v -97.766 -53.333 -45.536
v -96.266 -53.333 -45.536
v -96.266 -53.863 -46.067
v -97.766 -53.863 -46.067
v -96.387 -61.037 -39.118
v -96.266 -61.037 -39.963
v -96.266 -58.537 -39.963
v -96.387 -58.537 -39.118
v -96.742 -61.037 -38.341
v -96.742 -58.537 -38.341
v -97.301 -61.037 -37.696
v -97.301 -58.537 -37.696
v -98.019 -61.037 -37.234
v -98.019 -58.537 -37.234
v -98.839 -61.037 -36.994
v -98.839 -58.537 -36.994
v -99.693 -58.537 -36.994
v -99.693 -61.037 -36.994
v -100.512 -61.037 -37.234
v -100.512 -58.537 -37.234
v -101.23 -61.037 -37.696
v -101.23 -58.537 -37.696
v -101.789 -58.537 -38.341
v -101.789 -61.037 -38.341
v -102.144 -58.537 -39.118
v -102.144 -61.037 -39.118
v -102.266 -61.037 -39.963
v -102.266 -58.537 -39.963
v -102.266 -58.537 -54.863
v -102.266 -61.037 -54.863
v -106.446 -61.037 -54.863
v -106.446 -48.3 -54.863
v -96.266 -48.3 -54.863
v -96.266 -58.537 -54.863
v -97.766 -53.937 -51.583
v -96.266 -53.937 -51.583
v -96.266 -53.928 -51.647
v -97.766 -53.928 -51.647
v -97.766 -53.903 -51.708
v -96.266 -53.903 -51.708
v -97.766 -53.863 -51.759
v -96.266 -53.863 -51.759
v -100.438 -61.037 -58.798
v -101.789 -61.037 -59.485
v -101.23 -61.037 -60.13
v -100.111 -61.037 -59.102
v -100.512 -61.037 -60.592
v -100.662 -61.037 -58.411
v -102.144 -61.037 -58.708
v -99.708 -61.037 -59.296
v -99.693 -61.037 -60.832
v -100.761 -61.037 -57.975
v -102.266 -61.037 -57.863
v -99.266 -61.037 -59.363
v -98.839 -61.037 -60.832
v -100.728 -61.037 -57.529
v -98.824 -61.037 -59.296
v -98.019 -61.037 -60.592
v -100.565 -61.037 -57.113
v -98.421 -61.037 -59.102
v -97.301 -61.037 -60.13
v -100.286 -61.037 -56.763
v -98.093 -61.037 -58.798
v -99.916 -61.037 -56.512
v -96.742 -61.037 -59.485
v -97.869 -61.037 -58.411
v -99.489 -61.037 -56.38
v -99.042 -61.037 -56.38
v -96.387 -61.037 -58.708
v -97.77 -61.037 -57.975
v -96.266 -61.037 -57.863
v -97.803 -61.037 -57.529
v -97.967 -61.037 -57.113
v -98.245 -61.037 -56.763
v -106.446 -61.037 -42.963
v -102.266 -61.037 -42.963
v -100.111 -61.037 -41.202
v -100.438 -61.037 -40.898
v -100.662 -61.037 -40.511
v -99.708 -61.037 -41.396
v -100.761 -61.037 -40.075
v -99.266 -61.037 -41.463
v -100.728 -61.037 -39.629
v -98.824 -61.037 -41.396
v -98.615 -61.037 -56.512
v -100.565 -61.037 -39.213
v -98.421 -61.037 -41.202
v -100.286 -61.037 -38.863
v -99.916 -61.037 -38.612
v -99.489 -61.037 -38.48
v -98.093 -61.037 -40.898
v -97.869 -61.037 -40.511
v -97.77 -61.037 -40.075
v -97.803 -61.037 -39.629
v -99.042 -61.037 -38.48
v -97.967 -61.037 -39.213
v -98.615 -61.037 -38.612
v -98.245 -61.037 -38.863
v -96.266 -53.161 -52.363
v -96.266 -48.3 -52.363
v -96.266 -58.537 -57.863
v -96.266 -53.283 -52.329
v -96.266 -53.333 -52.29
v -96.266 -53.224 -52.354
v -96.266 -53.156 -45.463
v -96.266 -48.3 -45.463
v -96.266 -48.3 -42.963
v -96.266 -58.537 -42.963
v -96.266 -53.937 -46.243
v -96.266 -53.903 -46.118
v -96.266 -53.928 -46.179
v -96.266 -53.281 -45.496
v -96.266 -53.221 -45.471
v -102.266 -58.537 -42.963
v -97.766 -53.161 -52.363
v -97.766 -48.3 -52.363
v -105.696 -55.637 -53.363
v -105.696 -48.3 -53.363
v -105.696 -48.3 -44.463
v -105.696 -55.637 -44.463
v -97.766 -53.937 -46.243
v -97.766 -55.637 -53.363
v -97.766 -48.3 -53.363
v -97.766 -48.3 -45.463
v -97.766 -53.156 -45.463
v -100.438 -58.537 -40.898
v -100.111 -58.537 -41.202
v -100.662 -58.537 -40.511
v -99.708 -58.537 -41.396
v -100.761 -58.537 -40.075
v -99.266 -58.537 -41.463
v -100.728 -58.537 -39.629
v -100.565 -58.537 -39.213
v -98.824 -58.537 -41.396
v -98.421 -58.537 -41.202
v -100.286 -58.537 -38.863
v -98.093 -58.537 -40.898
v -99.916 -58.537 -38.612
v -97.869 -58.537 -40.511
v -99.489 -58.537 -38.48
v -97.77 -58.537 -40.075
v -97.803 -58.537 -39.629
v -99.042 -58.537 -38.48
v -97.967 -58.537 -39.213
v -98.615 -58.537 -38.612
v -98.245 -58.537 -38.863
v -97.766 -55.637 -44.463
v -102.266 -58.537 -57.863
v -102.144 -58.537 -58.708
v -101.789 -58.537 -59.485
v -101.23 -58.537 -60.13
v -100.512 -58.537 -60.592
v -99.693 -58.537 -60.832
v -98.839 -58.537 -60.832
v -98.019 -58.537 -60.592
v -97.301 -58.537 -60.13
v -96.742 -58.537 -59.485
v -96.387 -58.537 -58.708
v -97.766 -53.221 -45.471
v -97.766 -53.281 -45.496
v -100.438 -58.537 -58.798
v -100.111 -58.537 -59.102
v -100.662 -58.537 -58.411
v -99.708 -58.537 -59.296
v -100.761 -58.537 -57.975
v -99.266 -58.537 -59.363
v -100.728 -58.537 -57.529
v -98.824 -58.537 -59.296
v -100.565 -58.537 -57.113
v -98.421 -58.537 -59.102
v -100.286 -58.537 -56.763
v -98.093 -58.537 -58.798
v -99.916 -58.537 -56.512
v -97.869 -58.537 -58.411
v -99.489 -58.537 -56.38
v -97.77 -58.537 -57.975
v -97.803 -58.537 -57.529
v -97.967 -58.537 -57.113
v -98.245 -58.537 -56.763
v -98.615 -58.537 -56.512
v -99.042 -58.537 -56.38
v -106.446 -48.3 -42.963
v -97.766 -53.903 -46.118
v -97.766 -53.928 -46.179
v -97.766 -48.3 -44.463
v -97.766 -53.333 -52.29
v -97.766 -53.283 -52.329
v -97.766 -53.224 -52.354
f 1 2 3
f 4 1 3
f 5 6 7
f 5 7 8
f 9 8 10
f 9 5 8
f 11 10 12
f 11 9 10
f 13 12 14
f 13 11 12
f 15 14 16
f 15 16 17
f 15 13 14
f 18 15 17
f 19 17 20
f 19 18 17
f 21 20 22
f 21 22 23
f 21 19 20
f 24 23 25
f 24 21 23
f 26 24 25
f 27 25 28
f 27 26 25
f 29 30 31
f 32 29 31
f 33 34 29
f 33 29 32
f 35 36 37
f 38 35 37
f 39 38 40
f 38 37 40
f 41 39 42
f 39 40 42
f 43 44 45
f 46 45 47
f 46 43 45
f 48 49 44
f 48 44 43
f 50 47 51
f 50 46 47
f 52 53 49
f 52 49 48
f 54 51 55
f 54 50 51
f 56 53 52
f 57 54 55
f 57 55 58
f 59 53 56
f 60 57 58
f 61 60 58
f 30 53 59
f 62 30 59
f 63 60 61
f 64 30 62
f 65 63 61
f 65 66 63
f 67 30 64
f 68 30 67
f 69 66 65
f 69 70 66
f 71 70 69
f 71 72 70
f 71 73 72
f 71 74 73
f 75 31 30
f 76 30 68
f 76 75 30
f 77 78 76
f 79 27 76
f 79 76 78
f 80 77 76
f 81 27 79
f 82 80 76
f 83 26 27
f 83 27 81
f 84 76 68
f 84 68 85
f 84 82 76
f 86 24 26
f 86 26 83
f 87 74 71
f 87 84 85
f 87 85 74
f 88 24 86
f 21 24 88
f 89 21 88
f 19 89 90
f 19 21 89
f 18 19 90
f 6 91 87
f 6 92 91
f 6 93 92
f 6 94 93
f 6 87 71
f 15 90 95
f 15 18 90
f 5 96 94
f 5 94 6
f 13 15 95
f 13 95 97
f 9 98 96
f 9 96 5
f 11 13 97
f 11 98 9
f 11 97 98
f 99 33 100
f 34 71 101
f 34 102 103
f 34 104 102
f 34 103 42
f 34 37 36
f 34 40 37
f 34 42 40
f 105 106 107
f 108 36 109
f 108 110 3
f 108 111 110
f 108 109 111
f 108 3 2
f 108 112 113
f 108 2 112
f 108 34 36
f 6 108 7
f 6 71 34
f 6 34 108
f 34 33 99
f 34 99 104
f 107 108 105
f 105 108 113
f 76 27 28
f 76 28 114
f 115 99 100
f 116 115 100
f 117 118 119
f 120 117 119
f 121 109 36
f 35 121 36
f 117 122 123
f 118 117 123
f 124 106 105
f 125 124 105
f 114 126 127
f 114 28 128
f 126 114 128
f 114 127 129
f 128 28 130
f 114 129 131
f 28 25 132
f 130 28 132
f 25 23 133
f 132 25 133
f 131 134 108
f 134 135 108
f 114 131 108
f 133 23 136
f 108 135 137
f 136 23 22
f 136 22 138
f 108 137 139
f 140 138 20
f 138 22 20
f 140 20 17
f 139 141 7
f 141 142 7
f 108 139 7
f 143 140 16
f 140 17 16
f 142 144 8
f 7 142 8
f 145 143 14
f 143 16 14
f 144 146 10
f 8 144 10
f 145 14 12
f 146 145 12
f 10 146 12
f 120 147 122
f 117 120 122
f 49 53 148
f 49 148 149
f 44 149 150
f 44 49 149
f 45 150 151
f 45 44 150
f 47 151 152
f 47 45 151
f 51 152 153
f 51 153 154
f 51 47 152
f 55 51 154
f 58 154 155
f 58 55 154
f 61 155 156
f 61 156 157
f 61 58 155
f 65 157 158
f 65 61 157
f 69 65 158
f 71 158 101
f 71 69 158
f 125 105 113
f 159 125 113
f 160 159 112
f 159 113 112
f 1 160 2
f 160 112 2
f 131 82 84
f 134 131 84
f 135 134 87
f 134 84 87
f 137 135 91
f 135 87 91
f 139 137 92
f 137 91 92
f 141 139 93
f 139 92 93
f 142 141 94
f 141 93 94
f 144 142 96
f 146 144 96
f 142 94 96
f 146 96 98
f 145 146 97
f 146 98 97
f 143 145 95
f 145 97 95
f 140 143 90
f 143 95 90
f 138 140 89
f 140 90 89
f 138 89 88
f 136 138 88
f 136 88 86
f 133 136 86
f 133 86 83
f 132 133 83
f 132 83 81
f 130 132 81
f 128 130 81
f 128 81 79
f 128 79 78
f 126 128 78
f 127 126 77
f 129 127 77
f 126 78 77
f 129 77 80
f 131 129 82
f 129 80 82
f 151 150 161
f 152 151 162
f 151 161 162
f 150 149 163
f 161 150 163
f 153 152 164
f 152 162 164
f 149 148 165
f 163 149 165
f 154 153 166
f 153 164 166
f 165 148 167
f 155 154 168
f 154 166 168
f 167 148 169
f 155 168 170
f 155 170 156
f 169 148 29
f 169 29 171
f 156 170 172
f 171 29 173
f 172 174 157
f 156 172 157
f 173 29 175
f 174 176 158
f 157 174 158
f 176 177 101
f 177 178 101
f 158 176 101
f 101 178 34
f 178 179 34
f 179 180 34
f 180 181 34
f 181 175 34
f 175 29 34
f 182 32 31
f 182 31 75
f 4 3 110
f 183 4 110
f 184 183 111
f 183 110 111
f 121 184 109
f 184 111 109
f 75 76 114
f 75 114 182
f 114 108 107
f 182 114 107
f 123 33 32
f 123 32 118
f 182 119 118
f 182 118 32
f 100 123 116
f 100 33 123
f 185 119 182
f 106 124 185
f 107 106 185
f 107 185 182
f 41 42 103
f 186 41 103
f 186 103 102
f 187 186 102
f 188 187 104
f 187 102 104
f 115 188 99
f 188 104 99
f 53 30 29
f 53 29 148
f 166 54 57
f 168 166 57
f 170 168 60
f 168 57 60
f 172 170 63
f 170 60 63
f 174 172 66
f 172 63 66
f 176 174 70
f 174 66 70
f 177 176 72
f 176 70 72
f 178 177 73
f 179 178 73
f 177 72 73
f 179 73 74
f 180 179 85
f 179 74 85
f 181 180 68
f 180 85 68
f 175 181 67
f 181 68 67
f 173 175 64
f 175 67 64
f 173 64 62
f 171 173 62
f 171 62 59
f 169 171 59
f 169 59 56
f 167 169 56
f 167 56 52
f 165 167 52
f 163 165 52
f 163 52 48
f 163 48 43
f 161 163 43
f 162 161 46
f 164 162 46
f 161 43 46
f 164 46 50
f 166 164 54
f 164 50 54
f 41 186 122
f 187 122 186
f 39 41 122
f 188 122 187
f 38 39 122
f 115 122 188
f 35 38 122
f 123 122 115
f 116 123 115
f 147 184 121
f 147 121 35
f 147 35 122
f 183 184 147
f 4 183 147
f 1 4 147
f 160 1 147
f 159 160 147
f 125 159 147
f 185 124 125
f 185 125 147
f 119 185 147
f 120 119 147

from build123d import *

# Parameters (mm, degrees)
BOSS_EXTRUDE6_START     = 1.5
BOSS_EXTRUDE6_DEPTH     = 1.5
BOSS_EXTRUDE7_START     = 3
SKETCH1_5_W             = 11.9
SKETCH1_5_H             = 5.3
SKETCH1_5_W_2           = 1.5
SKETCH1_5_H_2           = 5.936611654
BOSS_EXTRUDE7_DEPTH     = 7.93
BOSS_EXTRUDE8_START     = 10.93
BOSS_EXTRUDE8_OUTLINE_W = 11.9
BOSS_EXTRUDE8_OUTLINE_H = 12.736611654
BOSS_EXTRUDE8_DEPTH     = 0.75
SKETCH4_R               = 1.5
BOSS_EXTRUDE10_DEPTH    = 2.5


# Read off the part's stored shape, not the designer's step: Boss-Extrude8
with BuildPart() as part:
    # Sketch1 → Boss-Extrude6 (new body)
    with BuildSketch(Plane.ZY.offset(94.76563723).offset(BOSS_EXTRUDE6_START)):
        with BuildLine():
            Line((-51.759425025, -53.863488773), (-52.289755114, -53.333158684))
            ThreePointArc((-52.289755114, -53.333158684), (-52.343100233, -53.254101332), (-52.362978418, -53.160824194))
            Line((-52.362978418, -53.160824194), (-52.362978418, -48.300100424))
            Line((-52.362978418, -48.300100424), (-54.862978418, -48.300100424))
            Line((-54.862978418, -48.300100424), (-54.862978418, -61.036712078))
            Line((-54.862978418, -61.036712078), (-42.962978418, -61.036712078))
            Line((-42.962978418, -61.036712078), (-42.962978418, -48.300100424))
            Line((-42.962978418, -48.300100424), (-45.462978418, -48.300100424))
            Line((-45.462978418, -48.300100424), (-45.462978418, -53.156381989))
            ThreePointArc((-45.462978418, -53.156381989), (-45.482008535, -53.252052847), (-45.536201723, -53.333158684))
            Line((-45.536201723, -53.333158684), (-46.066531809, -53.86348877))
            ThreePointArc((-46.066531809, -53.86348877), (-46.147637646, -53.917681958), (-46.243308504, -53.936712075))
            Line((-46.243308504, -53.936712075), (-51.582648329, -53.936712078))
            ThreePointArc((-51.582648329, -53.936712078), (-51.678319187, -53.917681961), (-51.759425025, -53.863488773))
        make_face()
    extrude(amount=BOSS_EXTRUDE6_DEPTH)

    # Sketch1<5> → Boss-Extrude7 (add)
    with BuildSketch(Plane.ZY.offset(94.76563723).offset(BOSS_EXTRUDE7_START)):
        with Locations((-48.912978418, -58.386712078)):
            Rectangle(SKETCH1_5_W, SKETCH1_5_H)
        Polygon((-53.362978418, -55.636712078), (-53.362978418, -54.236712078), (-54.862978418, -54.236712078), (-54.862978418, -55.736712078), (-42.962978418, -55.736712078), (-42.962978418, -54.236712078), (-44.462978418, -54.236712078), (-44.462978418, -55.636712078), align=None)
        with Locations((-54.112978418, -51.268406251)):
            Rectangle(SKETCH1_5_W_2, SKETCH1_5_H_2)
        with Locations((-43.712978418, -51.268406251)):
            Rectangle(SKETCH1_5_W_2, SKETCH1_5_H_2)
    extrude(amount=BOSS_EXTRUDE7_DEPTH)

    # Boss-Extrude8 outline → Boss-Extrude8 (add)
    with BuildSketch(Plane.ZY.offset(94.76563723).offset(BOSS_EXTRUDE8_START)):
        with Locations((-48.912978418, -54.668406251)):
            Rectangle(BOSS_EXTRUDE8_OUTLINE_W, BOSS_EXTRUDE8_OUTLINE_H)
    extrude(amount=BOSS_EXTRUDE8_DEPTH)

    # Sketch4 → Boss-Extrude10 (add)
    # profile 1 of 2: a face of its own
    with BuildSketch(Plane.XZ.offset(61.036712078)):
        with BuildLine():
            Line((-102.26563723, -39.962978418), (-102.26563723, -42.962978418))
            Line((-102.26563723, -42.962978418), (-96.26563723, -42.962978418))
            Line((-96.26563723, -42.962978418), (-96.26563723, -39.962978418))
            ThreePointArc((-96.26563723, -39.962978418), (-99.26563723, -36.962978418), (-102.26563723, -39.962978418))
        make_face()
        with Locations(Location((-99.26563723, -39.962978418, 0), (0, 0, 270))):
            Circle(SKETCH4_R, mode=Mode.SUBTRACT)
    # profile 2 of 2: a face of its own
    with BuildSketch(Plane.XZ.offset(61.036712078)):
        with BuildLine():
            Line((-96.26563723, -57.862978418), (-96.26563723, -54.862978418))
            Line((-96.26563723, -54.862978418), (-102.26563723, -54.862978418))
            Line((-102.26563723, -54.862978418), (-102.26563723, -57.862978418))
            ThreePointArc((-102.26563723, -57.862978418), (-99.26563723, -60.862978418), (-96.26563723, -57.862978418))
        make_face()
        with Locations(Location((-99.26563723, -57.862978418, 0), (0, 0, 270))):
            Circle(SKETCH4_R, mode=Mode.SUBTRACT)
    extrude(amount=-BOSS_EXTRUDE10_DEPTH)


solid = part.part
